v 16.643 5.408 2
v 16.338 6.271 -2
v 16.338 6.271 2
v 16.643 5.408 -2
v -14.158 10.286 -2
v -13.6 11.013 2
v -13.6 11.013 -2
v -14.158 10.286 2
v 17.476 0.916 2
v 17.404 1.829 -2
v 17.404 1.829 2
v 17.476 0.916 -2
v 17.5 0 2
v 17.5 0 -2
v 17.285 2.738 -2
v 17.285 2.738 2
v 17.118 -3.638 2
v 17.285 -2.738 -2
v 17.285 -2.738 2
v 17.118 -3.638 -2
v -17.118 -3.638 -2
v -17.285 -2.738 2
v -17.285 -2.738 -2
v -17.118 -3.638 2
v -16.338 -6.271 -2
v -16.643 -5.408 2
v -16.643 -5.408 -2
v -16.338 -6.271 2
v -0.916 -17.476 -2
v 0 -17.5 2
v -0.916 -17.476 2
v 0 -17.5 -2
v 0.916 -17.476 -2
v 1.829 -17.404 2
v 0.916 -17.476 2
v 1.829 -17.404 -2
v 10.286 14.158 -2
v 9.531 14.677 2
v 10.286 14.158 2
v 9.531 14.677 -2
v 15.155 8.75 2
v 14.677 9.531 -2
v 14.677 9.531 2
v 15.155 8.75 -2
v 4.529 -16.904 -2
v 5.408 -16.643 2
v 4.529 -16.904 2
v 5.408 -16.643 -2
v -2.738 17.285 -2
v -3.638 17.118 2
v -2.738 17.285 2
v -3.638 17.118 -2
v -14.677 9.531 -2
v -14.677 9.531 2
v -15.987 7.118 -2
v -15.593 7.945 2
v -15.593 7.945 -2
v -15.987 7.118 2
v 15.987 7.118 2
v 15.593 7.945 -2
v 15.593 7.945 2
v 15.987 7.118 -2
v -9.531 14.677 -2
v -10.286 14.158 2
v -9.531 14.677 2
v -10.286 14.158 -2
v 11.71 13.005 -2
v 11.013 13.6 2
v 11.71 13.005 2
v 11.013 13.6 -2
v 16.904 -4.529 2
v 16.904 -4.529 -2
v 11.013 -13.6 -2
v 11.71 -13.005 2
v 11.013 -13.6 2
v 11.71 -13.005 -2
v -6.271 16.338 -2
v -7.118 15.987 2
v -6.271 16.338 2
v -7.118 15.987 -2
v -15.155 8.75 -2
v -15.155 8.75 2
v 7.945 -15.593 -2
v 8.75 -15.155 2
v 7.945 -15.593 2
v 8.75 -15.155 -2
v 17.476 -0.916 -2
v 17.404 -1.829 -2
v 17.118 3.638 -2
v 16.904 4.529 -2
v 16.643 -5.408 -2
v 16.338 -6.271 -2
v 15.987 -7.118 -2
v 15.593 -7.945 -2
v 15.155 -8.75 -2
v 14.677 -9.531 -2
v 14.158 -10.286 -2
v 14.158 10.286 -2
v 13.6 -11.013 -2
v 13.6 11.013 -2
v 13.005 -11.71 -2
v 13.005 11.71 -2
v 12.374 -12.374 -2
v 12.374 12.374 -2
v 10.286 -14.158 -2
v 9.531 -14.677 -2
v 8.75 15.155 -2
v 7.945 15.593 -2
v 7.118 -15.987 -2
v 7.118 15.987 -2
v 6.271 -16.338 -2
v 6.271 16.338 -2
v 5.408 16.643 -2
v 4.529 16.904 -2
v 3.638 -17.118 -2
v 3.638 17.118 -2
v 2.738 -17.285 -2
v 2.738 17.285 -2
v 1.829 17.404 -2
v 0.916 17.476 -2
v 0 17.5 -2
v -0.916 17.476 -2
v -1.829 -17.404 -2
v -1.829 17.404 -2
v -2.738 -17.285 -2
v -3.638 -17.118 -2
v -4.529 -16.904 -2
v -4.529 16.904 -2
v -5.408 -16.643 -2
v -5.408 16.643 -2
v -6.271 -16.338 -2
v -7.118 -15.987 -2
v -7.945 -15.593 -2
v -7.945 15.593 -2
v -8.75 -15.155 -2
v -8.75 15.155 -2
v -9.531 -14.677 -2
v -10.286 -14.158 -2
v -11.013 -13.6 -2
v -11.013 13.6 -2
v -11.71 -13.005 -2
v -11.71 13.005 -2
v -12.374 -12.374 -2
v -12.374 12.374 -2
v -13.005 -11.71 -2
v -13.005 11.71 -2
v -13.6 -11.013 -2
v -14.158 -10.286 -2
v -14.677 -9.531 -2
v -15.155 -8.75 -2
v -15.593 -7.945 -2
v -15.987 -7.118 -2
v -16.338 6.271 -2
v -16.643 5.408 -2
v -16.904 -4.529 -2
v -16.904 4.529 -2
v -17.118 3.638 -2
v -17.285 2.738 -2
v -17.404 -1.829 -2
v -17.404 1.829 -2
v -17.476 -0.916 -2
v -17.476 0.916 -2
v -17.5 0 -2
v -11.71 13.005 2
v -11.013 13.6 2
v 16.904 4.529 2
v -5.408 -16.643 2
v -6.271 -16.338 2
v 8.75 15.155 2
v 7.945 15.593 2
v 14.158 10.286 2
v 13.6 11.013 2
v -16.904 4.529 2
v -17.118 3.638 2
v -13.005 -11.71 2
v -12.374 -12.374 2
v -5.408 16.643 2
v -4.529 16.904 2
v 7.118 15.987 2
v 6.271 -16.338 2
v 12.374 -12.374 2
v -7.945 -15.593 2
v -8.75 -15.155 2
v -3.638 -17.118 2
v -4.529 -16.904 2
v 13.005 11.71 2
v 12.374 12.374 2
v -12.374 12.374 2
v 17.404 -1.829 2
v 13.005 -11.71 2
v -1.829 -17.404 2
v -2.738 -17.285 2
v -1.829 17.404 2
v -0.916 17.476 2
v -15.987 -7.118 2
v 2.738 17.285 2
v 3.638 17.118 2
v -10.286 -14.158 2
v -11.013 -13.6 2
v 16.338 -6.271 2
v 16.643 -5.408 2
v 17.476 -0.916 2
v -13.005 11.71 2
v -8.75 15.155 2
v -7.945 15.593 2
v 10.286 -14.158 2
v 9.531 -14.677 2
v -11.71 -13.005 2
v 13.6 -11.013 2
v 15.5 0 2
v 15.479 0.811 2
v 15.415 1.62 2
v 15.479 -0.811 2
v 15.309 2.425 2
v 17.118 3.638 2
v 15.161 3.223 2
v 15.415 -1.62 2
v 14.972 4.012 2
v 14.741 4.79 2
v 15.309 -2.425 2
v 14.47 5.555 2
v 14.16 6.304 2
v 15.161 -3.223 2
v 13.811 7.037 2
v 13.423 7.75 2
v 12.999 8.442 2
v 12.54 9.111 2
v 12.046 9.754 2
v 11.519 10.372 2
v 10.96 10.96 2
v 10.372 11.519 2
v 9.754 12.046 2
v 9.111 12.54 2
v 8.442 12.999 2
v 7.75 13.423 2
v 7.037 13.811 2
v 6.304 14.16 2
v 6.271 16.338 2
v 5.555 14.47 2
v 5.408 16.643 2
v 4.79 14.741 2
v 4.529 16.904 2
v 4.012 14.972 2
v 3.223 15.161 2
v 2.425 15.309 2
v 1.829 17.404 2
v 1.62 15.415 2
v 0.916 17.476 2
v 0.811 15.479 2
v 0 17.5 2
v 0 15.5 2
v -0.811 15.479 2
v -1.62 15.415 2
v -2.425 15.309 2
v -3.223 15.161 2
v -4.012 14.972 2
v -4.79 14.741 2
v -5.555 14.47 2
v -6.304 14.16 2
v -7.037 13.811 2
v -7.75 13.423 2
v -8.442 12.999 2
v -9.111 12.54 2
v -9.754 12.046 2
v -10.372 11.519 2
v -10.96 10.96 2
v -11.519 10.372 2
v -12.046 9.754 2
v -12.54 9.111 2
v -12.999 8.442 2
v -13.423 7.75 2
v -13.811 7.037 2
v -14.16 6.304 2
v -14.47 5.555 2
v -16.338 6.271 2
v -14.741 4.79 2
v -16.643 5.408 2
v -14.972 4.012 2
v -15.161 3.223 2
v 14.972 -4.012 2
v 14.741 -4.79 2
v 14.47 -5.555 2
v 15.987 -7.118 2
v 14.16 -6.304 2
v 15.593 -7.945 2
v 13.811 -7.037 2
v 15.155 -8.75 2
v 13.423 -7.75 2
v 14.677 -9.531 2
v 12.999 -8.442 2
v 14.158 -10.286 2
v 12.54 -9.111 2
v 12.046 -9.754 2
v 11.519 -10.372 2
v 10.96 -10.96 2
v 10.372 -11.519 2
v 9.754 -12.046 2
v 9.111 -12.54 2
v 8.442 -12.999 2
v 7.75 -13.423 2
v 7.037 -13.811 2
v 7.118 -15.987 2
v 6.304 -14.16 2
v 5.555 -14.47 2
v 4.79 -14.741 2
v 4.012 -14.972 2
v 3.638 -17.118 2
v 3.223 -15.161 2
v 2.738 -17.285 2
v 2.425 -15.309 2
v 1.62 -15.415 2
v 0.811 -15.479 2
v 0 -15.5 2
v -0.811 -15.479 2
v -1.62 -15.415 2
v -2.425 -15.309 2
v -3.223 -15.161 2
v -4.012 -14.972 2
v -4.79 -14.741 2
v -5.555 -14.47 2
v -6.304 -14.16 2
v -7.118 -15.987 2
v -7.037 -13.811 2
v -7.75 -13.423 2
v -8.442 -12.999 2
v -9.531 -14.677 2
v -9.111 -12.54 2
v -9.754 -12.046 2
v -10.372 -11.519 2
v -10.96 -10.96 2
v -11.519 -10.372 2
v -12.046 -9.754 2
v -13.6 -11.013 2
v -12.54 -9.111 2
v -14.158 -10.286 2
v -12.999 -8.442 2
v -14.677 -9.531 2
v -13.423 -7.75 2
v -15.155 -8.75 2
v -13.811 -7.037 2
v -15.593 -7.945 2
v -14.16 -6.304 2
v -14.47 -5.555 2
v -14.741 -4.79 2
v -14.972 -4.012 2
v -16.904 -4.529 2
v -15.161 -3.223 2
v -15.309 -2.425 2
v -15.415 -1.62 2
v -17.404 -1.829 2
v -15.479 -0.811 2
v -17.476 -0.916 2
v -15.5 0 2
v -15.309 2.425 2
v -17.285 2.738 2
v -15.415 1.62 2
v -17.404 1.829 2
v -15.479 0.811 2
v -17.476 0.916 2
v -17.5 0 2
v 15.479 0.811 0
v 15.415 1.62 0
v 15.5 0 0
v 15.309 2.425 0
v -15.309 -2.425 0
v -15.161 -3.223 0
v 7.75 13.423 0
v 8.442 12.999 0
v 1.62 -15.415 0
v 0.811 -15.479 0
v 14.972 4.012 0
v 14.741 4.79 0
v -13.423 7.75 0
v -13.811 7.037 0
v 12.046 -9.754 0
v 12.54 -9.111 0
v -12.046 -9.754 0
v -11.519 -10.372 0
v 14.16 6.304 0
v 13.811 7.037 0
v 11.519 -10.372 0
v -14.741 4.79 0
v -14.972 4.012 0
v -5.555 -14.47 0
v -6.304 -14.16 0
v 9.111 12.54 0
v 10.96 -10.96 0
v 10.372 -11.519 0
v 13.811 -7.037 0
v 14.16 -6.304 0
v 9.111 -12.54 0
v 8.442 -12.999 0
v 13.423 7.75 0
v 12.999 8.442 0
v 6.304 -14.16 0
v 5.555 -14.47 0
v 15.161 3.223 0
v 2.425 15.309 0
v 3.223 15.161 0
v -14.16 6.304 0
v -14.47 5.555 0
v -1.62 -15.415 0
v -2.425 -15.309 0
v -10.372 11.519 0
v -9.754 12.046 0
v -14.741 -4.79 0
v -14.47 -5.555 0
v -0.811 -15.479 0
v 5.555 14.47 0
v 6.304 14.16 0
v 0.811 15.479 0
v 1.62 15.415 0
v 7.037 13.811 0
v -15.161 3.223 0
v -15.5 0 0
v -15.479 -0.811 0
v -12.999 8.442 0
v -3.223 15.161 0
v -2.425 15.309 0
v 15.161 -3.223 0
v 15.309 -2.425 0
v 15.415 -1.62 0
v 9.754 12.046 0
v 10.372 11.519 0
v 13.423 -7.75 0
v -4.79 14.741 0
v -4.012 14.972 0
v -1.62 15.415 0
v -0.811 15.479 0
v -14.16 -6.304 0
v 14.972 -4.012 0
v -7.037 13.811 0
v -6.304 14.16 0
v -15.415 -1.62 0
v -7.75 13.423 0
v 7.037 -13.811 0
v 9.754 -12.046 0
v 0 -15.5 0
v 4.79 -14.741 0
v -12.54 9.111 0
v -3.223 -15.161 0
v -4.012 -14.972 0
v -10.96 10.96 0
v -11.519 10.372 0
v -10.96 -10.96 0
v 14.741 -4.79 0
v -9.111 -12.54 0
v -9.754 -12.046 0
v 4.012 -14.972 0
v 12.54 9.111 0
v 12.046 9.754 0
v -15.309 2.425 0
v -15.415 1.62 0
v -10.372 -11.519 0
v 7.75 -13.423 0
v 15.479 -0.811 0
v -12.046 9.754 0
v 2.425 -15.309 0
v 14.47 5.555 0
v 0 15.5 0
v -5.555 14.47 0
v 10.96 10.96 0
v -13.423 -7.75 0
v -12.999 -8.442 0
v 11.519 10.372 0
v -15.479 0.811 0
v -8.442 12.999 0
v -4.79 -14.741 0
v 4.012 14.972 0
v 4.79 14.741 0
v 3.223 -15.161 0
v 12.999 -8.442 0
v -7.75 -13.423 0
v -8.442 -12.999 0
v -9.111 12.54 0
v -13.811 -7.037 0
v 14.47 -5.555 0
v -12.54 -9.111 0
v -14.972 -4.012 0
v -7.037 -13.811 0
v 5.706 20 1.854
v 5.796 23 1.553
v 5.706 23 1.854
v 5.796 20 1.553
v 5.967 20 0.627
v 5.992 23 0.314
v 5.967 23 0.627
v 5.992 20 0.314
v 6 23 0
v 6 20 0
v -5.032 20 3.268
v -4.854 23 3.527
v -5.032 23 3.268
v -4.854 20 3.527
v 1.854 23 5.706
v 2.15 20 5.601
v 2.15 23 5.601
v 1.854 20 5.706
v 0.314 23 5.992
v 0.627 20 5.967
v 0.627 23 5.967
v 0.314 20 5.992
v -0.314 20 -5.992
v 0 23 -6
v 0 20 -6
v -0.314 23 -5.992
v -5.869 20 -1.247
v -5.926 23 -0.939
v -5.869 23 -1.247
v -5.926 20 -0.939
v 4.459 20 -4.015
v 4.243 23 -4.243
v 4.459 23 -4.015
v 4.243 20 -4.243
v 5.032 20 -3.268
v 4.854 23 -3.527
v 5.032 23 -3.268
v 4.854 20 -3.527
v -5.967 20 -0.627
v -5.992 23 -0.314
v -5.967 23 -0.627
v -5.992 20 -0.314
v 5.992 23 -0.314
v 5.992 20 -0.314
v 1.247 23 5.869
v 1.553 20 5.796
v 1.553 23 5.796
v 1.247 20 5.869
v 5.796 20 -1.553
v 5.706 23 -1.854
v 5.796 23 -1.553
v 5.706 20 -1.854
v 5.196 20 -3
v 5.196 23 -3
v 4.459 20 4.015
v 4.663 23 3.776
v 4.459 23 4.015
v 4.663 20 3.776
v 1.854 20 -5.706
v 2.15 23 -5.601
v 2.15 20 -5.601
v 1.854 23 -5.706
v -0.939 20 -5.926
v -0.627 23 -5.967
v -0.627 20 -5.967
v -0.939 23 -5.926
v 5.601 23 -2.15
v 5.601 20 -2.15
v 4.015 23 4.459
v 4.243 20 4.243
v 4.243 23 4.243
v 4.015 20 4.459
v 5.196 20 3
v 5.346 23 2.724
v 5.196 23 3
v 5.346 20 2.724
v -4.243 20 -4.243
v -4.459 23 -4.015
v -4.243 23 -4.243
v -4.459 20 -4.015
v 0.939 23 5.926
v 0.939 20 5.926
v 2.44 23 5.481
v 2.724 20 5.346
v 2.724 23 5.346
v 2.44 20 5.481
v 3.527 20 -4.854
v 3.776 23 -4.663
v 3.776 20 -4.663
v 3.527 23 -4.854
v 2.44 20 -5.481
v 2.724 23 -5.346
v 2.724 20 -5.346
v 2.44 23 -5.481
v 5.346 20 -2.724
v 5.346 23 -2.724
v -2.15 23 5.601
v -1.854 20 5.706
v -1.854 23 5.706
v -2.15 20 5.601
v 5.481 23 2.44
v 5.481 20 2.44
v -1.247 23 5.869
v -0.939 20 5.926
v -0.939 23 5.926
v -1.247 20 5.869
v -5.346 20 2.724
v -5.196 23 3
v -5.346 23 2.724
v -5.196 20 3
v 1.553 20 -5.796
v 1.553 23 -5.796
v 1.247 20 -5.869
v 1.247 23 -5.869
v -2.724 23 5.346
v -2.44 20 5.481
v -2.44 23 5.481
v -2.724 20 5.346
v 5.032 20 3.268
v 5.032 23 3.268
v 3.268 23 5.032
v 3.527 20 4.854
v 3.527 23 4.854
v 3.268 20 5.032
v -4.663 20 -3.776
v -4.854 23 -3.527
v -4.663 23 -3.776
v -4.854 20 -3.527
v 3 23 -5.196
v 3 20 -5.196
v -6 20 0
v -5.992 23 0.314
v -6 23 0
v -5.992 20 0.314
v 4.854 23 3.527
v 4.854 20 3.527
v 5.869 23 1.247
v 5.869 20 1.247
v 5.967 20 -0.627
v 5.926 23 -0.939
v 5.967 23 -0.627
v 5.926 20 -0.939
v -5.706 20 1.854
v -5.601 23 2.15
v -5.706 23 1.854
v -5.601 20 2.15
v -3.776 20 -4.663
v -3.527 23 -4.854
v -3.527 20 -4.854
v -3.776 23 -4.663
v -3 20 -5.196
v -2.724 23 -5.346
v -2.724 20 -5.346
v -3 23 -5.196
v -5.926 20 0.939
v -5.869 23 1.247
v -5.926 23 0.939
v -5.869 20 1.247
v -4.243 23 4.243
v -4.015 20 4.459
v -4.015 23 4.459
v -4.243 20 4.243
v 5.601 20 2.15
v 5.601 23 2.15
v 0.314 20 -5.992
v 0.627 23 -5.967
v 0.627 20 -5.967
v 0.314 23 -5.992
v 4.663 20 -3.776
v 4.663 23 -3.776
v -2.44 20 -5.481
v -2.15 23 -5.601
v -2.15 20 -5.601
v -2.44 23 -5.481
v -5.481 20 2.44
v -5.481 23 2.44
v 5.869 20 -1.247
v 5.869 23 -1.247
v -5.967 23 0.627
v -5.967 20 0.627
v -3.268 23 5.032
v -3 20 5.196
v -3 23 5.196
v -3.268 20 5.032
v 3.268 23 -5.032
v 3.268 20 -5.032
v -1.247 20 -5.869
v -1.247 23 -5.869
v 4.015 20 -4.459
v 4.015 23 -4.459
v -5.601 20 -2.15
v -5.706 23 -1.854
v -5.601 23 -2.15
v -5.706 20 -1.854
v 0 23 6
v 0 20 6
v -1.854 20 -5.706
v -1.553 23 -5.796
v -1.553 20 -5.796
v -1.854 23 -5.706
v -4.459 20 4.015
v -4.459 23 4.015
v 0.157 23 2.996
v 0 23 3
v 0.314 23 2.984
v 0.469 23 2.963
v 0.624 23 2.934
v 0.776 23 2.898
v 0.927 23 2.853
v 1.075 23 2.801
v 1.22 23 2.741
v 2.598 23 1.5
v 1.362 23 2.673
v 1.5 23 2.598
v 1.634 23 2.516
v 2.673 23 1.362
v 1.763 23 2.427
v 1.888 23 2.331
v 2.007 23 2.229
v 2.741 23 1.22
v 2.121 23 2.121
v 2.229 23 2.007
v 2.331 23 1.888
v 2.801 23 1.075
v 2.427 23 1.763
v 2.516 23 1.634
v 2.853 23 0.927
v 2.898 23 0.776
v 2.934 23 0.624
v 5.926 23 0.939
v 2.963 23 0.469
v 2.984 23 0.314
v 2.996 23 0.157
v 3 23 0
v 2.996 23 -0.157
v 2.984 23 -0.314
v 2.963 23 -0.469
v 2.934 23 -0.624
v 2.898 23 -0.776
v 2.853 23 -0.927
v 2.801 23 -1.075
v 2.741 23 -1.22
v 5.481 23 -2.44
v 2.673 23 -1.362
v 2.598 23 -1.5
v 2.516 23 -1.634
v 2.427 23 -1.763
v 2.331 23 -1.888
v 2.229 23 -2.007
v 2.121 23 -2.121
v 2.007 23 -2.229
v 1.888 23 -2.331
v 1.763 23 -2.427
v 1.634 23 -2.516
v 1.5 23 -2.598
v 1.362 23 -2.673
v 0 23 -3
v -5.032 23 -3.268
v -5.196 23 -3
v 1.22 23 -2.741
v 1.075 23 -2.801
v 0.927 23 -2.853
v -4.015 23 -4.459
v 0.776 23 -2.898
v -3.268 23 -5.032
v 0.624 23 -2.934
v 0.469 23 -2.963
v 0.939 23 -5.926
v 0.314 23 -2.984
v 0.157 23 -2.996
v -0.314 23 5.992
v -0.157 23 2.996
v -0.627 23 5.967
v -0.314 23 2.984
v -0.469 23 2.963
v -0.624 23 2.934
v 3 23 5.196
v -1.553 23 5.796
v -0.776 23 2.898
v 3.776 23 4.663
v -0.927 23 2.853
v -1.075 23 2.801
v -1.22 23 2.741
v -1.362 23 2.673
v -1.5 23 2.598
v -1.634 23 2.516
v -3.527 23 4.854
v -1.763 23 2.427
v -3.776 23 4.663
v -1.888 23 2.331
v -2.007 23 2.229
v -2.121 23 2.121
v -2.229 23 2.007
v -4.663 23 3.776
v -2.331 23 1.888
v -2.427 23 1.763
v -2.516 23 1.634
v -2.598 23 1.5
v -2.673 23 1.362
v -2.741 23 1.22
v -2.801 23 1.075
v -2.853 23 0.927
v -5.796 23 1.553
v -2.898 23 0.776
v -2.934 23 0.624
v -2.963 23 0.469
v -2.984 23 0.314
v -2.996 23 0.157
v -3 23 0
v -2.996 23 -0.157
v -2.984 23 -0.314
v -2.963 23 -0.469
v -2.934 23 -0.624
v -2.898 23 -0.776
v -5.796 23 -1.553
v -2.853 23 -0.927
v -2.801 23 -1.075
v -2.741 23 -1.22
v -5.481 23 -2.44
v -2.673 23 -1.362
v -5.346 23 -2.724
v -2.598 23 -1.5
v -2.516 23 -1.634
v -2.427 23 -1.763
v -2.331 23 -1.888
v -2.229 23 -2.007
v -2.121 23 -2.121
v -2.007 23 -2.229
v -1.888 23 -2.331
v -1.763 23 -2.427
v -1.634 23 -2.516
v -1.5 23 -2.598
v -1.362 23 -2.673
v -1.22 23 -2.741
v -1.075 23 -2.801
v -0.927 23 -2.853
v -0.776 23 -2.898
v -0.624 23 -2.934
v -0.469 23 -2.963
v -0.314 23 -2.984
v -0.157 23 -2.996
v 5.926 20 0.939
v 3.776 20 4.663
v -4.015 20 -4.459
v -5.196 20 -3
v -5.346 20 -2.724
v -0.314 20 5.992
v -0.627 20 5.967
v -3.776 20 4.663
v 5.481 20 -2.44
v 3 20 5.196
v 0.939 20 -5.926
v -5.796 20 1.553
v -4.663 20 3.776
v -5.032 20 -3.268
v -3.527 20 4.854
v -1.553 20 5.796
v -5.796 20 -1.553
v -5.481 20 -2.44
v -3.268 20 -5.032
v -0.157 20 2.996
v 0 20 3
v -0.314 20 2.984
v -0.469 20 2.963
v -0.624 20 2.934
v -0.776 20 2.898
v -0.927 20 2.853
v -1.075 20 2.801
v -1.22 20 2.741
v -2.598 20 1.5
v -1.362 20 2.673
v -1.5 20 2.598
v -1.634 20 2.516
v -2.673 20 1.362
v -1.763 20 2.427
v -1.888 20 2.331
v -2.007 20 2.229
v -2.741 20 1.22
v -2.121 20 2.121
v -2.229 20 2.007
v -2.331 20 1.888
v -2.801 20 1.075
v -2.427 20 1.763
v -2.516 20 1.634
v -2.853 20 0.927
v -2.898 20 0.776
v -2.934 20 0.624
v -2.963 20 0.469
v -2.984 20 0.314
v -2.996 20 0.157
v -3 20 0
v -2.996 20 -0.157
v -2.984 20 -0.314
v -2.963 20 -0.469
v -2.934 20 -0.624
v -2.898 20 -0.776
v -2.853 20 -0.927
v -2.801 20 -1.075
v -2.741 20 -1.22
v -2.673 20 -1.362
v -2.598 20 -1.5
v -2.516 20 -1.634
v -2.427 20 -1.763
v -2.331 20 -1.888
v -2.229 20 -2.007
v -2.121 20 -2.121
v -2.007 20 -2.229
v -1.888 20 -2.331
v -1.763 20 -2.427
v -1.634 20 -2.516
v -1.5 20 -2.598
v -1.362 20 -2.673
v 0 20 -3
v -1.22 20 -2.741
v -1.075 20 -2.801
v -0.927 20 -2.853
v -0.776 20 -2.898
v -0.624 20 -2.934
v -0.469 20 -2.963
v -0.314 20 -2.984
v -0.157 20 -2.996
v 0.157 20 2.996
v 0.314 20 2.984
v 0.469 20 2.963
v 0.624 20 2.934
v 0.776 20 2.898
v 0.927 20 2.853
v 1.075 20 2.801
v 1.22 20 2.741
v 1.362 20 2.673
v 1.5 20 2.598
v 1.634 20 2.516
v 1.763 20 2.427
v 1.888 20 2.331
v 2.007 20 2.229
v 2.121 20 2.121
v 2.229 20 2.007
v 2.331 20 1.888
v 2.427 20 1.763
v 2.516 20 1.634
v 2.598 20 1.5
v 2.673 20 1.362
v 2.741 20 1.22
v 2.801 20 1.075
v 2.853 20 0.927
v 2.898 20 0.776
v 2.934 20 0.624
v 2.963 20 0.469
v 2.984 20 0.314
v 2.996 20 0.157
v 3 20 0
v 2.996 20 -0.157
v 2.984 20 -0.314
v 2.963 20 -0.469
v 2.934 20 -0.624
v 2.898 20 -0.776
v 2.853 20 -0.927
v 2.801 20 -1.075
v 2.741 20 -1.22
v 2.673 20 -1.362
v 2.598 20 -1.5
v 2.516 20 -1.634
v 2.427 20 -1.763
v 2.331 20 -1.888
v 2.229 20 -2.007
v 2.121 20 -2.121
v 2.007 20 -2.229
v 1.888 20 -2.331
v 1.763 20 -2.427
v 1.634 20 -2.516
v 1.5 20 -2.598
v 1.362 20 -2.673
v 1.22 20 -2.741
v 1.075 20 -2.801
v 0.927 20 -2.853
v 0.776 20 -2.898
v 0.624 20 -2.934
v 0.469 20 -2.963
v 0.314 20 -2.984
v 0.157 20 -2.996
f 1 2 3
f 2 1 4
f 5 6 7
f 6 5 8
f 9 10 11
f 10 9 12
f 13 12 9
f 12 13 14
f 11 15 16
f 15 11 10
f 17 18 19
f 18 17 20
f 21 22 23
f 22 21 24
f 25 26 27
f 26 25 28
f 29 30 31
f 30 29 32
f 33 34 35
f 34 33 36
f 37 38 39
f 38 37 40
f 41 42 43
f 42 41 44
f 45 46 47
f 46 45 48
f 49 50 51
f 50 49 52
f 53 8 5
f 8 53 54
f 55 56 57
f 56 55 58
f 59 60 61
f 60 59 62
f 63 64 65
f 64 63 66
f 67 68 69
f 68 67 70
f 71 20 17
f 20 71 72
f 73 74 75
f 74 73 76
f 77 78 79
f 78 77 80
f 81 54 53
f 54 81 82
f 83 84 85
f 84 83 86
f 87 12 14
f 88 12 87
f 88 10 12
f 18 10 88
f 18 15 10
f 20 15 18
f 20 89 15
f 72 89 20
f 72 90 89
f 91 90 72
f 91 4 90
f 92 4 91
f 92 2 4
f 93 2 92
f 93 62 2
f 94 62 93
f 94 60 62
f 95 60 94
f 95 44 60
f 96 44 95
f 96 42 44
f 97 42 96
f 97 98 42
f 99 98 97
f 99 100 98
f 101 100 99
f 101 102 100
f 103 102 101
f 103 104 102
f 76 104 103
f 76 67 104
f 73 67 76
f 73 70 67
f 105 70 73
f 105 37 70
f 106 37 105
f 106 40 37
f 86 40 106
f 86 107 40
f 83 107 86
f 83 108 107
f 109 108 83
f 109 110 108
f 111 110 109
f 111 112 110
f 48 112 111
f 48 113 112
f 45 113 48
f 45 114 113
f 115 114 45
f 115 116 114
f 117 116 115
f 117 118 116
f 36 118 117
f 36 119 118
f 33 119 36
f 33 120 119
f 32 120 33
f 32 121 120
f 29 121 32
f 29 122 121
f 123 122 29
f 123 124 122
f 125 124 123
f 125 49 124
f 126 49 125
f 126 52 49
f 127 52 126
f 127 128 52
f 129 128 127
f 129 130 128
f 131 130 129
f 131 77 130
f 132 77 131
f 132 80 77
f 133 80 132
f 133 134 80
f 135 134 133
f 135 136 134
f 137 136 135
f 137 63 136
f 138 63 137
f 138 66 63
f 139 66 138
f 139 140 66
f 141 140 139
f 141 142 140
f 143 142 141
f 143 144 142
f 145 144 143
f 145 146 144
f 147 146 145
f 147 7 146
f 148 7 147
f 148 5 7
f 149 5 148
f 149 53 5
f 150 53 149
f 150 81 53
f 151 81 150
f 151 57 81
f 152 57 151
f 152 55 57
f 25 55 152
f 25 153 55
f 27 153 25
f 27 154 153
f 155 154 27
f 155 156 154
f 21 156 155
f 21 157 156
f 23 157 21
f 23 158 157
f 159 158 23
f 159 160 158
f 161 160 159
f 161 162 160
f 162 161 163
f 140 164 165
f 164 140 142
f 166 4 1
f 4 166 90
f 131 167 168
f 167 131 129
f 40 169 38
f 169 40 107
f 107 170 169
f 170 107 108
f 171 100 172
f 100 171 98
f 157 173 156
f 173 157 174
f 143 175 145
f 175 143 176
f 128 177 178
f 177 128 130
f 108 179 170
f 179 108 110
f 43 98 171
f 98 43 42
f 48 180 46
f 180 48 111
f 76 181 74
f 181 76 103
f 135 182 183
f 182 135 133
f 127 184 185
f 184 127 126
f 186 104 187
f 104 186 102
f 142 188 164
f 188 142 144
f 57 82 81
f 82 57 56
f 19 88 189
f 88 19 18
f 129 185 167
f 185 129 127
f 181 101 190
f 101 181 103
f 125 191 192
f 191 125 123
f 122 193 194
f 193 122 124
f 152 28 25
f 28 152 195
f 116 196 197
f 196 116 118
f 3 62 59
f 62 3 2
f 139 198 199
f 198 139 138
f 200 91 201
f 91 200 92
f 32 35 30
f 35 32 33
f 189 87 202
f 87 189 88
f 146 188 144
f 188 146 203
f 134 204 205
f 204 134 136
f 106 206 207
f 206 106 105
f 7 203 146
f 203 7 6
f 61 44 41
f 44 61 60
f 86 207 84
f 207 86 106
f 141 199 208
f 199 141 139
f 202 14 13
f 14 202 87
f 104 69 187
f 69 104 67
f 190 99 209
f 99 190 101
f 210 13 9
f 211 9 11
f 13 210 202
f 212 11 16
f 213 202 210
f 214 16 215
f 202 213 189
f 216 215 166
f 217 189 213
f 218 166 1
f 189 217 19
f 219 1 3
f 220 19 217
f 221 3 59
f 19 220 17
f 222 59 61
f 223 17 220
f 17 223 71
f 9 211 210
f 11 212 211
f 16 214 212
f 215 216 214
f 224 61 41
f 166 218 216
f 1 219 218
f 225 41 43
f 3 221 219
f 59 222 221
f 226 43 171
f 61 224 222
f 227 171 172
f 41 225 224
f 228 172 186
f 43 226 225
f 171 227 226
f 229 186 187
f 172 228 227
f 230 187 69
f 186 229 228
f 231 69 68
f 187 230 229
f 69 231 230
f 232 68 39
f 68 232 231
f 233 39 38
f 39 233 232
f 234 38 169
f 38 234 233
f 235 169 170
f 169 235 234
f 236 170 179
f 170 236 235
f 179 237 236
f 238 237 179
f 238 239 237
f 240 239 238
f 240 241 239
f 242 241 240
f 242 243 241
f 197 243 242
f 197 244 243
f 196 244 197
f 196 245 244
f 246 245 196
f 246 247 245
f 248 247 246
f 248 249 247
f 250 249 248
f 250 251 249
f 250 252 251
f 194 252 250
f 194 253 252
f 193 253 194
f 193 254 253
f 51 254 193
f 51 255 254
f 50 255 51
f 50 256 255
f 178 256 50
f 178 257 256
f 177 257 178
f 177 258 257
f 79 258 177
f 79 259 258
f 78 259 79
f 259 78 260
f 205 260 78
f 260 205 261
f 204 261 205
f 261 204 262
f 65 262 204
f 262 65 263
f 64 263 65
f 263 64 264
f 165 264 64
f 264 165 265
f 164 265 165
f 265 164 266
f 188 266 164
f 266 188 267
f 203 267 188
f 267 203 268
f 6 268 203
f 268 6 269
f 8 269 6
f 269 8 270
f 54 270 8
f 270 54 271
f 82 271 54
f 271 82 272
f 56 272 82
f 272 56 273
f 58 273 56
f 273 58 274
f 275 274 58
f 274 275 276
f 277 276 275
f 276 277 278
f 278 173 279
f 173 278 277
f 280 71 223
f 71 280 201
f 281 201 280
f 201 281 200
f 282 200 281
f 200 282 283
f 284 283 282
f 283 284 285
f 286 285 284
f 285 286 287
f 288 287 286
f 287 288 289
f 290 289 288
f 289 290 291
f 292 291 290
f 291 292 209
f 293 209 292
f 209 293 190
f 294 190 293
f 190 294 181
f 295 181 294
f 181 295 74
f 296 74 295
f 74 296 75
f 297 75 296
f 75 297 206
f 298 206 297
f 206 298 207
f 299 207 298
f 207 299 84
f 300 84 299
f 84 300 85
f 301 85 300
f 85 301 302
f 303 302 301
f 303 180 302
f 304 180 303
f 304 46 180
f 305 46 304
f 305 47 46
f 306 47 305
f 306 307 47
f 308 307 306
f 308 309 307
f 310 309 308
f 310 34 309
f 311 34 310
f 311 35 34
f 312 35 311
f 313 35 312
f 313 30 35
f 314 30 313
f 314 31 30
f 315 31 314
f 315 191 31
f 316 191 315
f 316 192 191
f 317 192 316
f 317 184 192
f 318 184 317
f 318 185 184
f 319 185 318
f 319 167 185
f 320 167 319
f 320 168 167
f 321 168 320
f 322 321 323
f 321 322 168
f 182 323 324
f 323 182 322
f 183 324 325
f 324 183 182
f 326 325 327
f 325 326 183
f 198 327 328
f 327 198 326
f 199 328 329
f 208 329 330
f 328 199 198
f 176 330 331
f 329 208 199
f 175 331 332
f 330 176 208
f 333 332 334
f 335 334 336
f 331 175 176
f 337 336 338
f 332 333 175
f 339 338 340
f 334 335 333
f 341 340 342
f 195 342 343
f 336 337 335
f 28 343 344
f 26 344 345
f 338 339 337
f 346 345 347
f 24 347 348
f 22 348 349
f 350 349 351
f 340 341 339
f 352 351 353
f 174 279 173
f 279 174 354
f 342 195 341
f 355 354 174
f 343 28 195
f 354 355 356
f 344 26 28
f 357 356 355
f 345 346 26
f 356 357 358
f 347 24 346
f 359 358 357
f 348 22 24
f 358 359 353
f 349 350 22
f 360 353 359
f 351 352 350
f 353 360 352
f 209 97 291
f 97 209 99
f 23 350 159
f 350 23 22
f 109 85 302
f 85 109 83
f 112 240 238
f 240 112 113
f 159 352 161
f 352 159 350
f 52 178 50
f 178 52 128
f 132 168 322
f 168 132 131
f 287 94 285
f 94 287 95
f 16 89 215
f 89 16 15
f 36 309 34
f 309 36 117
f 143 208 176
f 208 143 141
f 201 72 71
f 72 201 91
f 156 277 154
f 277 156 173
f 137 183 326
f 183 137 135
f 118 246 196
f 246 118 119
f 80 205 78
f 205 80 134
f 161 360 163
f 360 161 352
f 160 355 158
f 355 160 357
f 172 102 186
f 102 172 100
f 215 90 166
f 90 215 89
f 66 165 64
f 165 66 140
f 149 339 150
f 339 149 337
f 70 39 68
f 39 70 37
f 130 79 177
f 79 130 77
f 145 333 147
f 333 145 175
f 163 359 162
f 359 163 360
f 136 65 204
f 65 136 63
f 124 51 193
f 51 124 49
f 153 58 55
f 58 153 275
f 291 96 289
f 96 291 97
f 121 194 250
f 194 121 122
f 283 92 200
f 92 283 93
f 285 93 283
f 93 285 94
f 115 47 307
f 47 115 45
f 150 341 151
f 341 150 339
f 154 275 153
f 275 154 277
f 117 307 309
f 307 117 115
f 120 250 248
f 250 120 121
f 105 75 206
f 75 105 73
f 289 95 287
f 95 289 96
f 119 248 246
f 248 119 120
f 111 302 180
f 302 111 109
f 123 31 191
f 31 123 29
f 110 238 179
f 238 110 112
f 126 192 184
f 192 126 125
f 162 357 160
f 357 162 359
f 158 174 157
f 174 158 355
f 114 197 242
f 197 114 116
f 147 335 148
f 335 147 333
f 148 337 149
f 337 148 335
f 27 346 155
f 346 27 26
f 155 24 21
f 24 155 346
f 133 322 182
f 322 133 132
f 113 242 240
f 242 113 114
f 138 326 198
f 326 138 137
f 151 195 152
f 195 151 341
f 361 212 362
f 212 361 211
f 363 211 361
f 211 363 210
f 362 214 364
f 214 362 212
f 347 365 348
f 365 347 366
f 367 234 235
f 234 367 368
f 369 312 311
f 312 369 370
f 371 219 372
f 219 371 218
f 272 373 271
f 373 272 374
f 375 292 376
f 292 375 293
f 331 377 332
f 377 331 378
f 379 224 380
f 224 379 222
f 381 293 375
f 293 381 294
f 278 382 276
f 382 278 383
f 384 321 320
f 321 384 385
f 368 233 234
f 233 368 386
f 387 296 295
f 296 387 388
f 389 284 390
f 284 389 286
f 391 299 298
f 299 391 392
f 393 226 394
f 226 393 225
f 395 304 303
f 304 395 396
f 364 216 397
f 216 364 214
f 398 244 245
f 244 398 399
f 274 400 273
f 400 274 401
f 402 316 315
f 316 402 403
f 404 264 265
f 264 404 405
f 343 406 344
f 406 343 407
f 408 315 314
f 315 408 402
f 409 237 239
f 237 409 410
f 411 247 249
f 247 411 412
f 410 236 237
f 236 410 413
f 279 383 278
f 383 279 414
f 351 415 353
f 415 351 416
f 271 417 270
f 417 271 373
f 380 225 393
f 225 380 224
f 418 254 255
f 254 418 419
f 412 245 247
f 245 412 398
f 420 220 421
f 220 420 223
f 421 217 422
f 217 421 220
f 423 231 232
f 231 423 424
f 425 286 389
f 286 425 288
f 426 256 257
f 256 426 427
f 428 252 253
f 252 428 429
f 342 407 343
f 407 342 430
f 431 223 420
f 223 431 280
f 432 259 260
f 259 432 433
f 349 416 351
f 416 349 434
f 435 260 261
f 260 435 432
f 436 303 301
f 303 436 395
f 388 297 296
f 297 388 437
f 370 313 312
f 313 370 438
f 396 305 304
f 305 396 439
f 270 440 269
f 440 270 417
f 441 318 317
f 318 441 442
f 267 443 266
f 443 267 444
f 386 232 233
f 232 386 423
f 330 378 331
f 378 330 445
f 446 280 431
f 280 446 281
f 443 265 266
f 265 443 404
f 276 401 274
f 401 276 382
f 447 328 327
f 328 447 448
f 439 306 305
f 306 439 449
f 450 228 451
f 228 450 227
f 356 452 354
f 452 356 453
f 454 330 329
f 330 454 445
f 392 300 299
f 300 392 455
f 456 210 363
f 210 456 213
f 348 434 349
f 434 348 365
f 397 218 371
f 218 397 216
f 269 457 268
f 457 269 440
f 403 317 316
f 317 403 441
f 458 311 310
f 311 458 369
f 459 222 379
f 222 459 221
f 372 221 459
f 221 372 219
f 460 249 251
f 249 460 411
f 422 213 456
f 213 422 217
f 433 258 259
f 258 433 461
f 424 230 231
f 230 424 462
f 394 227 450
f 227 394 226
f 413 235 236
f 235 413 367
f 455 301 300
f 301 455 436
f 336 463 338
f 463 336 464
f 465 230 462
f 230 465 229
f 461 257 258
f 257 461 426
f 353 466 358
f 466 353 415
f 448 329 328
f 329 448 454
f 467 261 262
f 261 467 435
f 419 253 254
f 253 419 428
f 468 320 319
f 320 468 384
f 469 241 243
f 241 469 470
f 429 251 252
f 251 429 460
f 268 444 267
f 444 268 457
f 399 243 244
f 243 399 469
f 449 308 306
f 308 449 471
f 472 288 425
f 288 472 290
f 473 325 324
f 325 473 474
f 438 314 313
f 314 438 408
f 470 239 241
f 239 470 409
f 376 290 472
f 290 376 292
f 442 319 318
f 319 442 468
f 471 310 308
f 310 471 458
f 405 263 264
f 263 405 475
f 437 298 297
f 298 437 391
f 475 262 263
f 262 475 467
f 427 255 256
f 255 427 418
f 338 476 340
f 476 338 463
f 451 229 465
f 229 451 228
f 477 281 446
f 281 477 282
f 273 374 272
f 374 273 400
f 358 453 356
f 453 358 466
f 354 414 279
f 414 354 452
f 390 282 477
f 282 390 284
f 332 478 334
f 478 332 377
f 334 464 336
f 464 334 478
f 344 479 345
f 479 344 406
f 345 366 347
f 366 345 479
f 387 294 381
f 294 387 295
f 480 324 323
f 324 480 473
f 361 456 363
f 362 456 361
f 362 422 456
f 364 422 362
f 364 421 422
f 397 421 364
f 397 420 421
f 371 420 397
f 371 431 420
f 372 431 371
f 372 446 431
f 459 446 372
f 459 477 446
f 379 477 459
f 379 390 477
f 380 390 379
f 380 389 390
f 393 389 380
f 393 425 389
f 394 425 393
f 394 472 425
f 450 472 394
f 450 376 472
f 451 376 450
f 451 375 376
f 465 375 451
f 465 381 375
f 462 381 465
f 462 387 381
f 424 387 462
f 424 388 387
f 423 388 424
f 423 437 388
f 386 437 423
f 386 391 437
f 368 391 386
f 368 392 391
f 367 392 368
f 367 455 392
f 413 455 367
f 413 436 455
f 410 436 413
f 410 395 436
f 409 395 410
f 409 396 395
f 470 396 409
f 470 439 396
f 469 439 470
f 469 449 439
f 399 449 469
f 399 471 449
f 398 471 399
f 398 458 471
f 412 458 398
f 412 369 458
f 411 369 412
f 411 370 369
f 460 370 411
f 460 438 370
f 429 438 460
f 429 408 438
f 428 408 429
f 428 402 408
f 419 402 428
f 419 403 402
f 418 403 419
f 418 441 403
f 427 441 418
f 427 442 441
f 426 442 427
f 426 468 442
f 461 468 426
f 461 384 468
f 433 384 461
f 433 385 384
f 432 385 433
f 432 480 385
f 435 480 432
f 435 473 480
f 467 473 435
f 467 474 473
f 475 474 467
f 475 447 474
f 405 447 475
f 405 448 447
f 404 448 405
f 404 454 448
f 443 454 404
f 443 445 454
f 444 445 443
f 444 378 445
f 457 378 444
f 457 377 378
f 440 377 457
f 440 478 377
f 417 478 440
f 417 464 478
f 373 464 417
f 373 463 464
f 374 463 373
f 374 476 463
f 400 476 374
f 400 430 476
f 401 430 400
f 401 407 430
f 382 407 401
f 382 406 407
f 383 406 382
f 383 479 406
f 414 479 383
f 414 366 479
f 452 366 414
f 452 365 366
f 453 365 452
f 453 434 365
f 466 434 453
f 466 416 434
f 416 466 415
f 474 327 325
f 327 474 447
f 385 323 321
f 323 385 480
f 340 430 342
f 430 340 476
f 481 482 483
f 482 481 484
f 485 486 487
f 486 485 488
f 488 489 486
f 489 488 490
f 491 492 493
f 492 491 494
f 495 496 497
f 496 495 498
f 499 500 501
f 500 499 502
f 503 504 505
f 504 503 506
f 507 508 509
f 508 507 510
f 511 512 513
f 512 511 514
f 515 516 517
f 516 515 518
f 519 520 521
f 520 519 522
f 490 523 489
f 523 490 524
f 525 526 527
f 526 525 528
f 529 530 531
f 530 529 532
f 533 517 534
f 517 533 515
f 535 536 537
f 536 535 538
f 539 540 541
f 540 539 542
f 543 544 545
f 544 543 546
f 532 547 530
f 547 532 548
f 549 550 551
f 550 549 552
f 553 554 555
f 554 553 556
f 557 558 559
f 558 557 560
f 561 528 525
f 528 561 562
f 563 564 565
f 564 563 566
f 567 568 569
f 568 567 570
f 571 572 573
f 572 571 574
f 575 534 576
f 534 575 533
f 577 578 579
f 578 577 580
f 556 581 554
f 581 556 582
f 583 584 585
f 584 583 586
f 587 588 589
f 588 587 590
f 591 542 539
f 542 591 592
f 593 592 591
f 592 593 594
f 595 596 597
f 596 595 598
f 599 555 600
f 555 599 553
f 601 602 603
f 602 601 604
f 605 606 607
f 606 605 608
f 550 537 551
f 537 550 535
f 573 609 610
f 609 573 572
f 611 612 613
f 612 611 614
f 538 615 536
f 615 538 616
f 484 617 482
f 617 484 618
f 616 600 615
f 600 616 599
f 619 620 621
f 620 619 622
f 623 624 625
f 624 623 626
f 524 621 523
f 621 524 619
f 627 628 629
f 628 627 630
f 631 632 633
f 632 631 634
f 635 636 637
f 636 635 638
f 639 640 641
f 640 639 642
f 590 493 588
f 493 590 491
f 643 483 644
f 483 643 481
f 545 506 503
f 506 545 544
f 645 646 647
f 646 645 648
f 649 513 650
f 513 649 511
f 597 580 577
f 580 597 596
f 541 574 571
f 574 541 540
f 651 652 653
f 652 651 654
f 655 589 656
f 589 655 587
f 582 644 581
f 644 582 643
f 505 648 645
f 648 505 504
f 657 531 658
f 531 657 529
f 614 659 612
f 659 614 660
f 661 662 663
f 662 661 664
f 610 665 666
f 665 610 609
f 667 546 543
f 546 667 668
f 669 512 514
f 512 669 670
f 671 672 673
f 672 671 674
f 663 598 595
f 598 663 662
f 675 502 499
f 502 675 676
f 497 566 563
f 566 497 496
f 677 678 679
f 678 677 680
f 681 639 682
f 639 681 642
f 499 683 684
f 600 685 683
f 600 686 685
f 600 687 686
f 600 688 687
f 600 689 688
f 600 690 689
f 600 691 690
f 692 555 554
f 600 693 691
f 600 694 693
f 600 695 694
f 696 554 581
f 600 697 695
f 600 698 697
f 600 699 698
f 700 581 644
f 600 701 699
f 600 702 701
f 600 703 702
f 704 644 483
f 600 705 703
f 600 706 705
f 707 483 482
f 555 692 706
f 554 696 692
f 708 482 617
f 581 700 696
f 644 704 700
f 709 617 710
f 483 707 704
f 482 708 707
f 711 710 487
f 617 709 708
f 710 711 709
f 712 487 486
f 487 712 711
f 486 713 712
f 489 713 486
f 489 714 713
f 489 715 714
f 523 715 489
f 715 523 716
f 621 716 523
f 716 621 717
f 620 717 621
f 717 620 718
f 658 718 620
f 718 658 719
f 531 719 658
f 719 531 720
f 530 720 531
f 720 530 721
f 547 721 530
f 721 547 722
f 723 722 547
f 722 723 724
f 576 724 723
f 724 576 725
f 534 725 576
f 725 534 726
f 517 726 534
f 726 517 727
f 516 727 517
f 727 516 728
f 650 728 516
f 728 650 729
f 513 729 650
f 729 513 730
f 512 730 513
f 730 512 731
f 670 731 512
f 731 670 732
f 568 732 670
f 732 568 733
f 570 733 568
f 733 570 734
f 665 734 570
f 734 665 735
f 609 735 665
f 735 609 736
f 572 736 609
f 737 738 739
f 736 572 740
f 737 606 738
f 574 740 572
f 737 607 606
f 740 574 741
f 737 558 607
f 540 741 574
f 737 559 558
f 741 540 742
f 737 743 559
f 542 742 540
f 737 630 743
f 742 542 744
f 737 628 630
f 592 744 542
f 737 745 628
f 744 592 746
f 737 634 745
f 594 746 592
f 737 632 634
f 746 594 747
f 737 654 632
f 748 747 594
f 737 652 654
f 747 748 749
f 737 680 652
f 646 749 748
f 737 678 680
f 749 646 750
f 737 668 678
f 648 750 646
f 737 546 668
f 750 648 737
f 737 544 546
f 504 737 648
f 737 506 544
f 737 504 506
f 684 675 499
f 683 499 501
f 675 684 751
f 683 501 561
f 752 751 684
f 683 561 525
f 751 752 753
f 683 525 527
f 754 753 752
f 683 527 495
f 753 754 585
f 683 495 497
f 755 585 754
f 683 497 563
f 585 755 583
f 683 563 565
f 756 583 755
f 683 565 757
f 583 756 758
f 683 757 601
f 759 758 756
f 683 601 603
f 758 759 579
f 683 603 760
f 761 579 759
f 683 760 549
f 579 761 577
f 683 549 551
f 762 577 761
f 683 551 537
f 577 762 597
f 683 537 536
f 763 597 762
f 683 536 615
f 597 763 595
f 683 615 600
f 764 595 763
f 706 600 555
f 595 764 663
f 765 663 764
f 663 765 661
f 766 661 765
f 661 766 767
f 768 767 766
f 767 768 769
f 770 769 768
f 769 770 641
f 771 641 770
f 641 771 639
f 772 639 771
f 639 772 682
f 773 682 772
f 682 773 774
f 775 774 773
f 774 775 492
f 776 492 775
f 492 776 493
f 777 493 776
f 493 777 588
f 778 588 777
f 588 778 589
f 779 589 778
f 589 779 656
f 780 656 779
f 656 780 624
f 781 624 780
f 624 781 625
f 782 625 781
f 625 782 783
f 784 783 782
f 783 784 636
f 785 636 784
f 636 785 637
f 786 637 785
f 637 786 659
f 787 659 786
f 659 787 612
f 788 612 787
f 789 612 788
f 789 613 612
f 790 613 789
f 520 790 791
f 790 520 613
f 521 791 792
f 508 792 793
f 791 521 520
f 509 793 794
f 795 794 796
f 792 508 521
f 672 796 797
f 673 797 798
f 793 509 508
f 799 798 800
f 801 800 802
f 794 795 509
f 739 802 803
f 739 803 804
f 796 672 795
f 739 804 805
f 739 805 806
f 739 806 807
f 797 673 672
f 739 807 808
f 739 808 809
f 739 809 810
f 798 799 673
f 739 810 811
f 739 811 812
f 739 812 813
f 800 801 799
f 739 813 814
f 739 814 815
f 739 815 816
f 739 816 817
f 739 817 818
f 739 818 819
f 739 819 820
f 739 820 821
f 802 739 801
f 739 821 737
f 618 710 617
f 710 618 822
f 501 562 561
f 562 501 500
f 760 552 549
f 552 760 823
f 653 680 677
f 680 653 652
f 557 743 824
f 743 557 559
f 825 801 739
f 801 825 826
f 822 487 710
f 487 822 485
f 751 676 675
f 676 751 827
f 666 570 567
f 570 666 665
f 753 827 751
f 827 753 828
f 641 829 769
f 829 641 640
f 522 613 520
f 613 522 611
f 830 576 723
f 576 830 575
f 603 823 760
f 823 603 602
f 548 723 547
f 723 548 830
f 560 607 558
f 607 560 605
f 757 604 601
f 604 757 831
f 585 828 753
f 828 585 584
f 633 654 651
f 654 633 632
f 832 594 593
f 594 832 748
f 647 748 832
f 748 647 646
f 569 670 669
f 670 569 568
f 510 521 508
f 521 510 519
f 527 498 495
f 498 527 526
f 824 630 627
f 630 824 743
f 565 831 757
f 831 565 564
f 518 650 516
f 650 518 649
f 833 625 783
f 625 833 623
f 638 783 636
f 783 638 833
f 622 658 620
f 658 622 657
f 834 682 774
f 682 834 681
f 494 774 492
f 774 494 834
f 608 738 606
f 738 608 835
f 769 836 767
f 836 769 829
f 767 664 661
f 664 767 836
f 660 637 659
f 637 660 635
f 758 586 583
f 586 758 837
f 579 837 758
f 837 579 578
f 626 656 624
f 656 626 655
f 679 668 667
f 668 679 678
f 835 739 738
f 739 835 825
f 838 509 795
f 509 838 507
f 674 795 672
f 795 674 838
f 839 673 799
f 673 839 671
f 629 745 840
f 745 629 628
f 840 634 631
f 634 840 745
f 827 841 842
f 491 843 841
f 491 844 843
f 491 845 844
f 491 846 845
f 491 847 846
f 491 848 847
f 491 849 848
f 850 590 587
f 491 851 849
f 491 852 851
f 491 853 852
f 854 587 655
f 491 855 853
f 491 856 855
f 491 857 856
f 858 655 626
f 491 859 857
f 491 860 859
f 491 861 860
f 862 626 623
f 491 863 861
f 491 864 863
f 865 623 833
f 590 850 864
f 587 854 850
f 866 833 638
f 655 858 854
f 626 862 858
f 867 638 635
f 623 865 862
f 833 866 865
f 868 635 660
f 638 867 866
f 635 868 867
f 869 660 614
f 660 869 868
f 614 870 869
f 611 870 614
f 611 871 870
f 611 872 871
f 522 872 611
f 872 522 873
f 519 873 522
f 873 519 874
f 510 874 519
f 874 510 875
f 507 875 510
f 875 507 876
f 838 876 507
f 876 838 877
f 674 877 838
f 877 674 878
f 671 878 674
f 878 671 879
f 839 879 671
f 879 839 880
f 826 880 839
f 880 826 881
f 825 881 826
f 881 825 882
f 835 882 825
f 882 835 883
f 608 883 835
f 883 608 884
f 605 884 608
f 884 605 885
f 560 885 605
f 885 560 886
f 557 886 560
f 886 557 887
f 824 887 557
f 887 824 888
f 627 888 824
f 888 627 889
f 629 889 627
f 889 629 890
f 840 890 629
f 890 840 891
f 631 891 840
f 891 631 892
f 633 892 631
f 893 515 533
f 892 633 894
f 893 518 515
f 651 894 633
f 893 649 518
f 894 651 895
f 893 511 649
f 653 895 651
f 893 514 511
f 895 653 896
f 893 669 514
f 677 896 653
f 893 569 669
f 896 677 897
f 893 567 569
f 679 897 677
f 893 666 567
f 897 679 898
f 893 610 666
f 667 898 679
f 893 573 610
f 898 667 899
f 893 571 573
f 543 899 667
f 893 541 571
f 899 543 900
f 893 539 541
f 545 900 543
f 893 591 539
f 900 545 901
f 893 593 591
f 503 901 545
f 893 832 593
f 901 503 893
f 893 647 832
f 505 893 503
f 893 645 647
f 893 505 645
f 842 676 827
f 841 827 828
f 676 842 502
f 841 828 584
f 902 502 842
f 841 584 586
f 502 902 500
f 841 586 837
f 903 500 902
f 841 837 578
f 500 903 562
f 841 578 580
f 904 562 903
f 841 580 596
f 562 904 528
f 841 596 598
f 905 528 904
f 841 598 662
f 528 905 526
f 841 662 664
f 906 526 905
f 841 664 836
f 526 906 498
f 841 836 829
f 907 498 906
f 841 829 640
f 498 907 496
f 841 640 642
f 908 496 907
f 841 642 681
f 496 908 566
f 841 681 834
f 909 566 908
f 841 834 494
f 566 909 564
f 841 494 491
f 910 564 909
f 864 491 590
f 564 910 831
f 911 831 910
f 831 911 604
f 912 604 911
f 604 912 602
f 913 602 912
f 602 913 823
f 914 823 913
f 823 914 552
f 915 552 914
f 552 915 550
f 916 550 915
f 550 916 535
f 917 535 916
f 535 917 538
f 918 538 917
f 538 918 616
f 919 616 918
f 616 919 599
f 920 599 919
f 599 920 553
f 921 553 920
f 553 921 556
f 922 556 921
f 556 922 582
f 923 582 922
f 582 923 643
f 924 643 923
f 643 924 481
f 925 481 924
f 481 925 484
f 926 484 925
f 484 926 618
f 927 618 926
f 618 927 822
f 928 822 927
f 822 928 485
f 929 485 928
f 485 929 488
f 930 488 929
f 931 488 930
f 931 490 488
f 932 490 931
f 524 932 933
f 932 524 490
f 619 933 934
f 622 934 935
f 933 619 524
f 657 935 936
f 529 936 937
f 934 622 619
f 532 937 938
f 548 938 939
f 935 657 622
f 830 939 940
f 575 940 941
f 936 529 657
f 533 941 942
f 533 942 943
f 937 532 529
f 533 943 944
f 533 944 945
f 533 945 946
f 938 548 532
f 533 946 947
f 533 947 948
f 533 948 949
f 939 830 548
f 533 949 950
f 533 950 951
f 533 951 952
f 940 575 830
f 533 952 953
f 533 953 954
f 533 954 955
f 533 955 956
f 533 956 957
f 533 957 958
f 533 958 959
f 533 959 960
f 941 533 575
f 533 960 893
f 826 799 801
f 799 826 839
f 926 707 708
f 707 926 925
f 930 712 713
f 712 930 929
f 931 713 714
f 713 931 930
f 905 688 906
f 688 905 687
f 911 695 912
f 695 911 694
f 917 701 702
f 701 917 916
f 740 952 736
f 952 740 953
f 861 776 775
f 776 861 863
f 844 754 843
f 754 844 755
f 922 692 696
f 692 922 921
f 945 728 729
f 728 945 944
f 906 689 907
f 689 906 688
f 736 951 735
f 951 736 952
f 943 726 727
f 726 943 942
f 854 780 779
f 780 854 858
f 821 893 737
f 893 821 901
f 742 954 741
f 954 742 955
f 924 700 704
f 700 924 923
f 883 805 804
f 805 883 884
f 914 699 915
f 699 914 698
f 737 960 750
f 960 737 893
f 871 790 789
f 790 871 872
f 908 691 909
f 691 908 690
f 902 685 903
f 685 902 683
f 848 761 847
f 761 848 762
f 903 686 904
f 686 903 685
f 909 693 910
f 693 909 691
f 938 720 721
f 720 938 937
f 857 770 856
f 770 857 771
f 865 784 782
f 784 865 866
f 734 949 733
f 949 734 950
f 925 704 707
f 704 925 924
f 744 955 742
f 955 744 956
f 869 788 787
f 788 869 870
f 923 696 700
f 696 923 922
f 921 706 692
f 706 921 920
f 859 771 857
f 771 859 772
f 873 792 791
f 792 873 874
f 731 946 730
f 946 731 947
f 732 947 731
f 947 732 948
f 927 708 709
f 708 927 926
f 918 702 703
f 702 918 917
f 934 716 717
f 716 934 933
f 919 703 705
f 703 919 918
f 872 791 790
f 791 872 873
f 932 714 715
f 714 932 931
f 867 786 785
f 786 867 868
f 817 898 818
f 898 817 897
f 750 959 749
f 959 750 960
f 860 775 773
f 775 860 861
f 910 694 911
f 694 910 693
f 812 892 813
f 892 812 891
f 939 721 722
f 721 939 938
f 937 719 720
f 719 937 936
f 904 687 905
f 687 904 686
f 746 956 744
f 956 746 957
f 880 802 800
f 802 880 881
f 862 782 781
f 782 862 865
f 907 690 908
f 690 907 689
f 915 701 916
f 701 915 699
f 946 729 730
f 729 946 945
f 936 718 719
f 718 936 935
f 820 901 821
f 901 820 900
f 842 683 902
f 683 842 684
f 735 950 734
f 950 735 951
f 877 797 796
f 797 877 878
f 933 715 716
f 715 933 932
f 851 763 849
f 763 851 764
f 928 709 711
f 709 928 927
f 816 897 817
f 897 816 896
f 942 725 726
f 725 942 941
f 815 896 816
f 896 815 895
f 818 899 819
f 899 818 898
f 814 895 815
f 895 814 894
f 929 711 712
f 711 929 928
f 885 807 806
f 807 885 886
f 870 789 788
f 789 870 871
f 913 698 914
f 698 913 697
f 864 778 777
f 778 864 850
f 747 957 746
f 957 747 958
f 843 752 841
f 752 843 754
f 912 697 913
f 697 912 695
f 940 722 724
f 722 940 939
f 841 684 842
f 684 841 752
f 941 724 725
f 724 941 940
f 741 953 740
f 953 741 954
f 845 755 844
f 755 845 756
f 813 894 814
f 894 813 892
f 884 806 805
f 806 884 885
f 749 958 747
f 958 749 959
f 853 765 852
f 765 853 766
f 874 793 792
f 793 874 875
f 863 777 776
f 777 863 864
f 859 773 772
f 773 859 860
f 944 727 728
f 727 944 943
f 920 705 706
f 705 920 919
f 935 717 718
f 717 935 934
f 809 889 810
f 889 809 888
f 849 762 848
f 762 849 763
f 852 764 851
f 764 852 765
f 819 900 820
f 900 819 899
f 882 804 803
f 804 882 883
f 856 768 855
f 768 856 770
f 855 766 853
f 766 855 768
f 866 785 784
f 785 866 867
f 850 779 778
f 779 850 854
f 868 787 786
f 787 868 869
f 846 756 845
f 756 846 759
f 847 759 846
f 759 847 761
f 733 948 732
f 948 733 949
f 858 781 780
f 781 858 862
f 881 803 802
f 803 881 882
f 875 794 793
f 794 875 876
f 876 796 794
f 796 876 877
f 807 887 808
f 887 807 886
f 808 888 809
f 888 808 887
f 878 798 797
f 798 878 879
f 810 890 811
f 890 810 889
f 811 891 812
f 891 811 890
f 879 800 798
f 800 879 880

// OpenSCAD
// ============================================================================
// VITA TESORI BY VHALSUEO - MASTER JEWELRY PORTFOLIO
// FILE: VT_Womens_Encolpion_v1.scad
// MATERIAL SPEC: 100% Solid 24K Gold Casting (Zero Lab Synthetics)
// ============================================================================

$fn = 120; // High-fidelity circle optimization for luxury casting

// Adjustable Master Dimensions (mm)
medallion_diameter = 35.0; // Outer face diameter
rim_thickness = 2.0;       // Width of structural decorative border step
base_depth = 4.0;          // Total structural thickness

module imperial_encolpion() {
    union() {
        // 1. Main Medallion Body (Stepped Concentric Geometry)
        difference() {
            // Outer Shield Floor
            cylinder(h=base_depth, d=medallion_diameter, center=true);
            
            // Recessed Flat Center Intended for Laser Engraving
            translate([0, 0, rim_thickness])
            cylinder(h=base_depth, d=medallion_diameter - (rim_thickness * 2), center=true);
        }
        
        // 2. Heavy-Duty Flanged Bail (Top Loop reinforced for combat load chains)
        translate([0, medallion_diameter/2 + 4, 0])
        rotate([90, 0, 0])
        difference() {
            cylinder(h=base_depth - 1, r=6, center=true);
            cylinder(h=base_depth + 2, r=3, center=true);
        }
    }
}

// Render the 3D Solid Gold Women's Encolpion Medallion
imperial_encolpion();
